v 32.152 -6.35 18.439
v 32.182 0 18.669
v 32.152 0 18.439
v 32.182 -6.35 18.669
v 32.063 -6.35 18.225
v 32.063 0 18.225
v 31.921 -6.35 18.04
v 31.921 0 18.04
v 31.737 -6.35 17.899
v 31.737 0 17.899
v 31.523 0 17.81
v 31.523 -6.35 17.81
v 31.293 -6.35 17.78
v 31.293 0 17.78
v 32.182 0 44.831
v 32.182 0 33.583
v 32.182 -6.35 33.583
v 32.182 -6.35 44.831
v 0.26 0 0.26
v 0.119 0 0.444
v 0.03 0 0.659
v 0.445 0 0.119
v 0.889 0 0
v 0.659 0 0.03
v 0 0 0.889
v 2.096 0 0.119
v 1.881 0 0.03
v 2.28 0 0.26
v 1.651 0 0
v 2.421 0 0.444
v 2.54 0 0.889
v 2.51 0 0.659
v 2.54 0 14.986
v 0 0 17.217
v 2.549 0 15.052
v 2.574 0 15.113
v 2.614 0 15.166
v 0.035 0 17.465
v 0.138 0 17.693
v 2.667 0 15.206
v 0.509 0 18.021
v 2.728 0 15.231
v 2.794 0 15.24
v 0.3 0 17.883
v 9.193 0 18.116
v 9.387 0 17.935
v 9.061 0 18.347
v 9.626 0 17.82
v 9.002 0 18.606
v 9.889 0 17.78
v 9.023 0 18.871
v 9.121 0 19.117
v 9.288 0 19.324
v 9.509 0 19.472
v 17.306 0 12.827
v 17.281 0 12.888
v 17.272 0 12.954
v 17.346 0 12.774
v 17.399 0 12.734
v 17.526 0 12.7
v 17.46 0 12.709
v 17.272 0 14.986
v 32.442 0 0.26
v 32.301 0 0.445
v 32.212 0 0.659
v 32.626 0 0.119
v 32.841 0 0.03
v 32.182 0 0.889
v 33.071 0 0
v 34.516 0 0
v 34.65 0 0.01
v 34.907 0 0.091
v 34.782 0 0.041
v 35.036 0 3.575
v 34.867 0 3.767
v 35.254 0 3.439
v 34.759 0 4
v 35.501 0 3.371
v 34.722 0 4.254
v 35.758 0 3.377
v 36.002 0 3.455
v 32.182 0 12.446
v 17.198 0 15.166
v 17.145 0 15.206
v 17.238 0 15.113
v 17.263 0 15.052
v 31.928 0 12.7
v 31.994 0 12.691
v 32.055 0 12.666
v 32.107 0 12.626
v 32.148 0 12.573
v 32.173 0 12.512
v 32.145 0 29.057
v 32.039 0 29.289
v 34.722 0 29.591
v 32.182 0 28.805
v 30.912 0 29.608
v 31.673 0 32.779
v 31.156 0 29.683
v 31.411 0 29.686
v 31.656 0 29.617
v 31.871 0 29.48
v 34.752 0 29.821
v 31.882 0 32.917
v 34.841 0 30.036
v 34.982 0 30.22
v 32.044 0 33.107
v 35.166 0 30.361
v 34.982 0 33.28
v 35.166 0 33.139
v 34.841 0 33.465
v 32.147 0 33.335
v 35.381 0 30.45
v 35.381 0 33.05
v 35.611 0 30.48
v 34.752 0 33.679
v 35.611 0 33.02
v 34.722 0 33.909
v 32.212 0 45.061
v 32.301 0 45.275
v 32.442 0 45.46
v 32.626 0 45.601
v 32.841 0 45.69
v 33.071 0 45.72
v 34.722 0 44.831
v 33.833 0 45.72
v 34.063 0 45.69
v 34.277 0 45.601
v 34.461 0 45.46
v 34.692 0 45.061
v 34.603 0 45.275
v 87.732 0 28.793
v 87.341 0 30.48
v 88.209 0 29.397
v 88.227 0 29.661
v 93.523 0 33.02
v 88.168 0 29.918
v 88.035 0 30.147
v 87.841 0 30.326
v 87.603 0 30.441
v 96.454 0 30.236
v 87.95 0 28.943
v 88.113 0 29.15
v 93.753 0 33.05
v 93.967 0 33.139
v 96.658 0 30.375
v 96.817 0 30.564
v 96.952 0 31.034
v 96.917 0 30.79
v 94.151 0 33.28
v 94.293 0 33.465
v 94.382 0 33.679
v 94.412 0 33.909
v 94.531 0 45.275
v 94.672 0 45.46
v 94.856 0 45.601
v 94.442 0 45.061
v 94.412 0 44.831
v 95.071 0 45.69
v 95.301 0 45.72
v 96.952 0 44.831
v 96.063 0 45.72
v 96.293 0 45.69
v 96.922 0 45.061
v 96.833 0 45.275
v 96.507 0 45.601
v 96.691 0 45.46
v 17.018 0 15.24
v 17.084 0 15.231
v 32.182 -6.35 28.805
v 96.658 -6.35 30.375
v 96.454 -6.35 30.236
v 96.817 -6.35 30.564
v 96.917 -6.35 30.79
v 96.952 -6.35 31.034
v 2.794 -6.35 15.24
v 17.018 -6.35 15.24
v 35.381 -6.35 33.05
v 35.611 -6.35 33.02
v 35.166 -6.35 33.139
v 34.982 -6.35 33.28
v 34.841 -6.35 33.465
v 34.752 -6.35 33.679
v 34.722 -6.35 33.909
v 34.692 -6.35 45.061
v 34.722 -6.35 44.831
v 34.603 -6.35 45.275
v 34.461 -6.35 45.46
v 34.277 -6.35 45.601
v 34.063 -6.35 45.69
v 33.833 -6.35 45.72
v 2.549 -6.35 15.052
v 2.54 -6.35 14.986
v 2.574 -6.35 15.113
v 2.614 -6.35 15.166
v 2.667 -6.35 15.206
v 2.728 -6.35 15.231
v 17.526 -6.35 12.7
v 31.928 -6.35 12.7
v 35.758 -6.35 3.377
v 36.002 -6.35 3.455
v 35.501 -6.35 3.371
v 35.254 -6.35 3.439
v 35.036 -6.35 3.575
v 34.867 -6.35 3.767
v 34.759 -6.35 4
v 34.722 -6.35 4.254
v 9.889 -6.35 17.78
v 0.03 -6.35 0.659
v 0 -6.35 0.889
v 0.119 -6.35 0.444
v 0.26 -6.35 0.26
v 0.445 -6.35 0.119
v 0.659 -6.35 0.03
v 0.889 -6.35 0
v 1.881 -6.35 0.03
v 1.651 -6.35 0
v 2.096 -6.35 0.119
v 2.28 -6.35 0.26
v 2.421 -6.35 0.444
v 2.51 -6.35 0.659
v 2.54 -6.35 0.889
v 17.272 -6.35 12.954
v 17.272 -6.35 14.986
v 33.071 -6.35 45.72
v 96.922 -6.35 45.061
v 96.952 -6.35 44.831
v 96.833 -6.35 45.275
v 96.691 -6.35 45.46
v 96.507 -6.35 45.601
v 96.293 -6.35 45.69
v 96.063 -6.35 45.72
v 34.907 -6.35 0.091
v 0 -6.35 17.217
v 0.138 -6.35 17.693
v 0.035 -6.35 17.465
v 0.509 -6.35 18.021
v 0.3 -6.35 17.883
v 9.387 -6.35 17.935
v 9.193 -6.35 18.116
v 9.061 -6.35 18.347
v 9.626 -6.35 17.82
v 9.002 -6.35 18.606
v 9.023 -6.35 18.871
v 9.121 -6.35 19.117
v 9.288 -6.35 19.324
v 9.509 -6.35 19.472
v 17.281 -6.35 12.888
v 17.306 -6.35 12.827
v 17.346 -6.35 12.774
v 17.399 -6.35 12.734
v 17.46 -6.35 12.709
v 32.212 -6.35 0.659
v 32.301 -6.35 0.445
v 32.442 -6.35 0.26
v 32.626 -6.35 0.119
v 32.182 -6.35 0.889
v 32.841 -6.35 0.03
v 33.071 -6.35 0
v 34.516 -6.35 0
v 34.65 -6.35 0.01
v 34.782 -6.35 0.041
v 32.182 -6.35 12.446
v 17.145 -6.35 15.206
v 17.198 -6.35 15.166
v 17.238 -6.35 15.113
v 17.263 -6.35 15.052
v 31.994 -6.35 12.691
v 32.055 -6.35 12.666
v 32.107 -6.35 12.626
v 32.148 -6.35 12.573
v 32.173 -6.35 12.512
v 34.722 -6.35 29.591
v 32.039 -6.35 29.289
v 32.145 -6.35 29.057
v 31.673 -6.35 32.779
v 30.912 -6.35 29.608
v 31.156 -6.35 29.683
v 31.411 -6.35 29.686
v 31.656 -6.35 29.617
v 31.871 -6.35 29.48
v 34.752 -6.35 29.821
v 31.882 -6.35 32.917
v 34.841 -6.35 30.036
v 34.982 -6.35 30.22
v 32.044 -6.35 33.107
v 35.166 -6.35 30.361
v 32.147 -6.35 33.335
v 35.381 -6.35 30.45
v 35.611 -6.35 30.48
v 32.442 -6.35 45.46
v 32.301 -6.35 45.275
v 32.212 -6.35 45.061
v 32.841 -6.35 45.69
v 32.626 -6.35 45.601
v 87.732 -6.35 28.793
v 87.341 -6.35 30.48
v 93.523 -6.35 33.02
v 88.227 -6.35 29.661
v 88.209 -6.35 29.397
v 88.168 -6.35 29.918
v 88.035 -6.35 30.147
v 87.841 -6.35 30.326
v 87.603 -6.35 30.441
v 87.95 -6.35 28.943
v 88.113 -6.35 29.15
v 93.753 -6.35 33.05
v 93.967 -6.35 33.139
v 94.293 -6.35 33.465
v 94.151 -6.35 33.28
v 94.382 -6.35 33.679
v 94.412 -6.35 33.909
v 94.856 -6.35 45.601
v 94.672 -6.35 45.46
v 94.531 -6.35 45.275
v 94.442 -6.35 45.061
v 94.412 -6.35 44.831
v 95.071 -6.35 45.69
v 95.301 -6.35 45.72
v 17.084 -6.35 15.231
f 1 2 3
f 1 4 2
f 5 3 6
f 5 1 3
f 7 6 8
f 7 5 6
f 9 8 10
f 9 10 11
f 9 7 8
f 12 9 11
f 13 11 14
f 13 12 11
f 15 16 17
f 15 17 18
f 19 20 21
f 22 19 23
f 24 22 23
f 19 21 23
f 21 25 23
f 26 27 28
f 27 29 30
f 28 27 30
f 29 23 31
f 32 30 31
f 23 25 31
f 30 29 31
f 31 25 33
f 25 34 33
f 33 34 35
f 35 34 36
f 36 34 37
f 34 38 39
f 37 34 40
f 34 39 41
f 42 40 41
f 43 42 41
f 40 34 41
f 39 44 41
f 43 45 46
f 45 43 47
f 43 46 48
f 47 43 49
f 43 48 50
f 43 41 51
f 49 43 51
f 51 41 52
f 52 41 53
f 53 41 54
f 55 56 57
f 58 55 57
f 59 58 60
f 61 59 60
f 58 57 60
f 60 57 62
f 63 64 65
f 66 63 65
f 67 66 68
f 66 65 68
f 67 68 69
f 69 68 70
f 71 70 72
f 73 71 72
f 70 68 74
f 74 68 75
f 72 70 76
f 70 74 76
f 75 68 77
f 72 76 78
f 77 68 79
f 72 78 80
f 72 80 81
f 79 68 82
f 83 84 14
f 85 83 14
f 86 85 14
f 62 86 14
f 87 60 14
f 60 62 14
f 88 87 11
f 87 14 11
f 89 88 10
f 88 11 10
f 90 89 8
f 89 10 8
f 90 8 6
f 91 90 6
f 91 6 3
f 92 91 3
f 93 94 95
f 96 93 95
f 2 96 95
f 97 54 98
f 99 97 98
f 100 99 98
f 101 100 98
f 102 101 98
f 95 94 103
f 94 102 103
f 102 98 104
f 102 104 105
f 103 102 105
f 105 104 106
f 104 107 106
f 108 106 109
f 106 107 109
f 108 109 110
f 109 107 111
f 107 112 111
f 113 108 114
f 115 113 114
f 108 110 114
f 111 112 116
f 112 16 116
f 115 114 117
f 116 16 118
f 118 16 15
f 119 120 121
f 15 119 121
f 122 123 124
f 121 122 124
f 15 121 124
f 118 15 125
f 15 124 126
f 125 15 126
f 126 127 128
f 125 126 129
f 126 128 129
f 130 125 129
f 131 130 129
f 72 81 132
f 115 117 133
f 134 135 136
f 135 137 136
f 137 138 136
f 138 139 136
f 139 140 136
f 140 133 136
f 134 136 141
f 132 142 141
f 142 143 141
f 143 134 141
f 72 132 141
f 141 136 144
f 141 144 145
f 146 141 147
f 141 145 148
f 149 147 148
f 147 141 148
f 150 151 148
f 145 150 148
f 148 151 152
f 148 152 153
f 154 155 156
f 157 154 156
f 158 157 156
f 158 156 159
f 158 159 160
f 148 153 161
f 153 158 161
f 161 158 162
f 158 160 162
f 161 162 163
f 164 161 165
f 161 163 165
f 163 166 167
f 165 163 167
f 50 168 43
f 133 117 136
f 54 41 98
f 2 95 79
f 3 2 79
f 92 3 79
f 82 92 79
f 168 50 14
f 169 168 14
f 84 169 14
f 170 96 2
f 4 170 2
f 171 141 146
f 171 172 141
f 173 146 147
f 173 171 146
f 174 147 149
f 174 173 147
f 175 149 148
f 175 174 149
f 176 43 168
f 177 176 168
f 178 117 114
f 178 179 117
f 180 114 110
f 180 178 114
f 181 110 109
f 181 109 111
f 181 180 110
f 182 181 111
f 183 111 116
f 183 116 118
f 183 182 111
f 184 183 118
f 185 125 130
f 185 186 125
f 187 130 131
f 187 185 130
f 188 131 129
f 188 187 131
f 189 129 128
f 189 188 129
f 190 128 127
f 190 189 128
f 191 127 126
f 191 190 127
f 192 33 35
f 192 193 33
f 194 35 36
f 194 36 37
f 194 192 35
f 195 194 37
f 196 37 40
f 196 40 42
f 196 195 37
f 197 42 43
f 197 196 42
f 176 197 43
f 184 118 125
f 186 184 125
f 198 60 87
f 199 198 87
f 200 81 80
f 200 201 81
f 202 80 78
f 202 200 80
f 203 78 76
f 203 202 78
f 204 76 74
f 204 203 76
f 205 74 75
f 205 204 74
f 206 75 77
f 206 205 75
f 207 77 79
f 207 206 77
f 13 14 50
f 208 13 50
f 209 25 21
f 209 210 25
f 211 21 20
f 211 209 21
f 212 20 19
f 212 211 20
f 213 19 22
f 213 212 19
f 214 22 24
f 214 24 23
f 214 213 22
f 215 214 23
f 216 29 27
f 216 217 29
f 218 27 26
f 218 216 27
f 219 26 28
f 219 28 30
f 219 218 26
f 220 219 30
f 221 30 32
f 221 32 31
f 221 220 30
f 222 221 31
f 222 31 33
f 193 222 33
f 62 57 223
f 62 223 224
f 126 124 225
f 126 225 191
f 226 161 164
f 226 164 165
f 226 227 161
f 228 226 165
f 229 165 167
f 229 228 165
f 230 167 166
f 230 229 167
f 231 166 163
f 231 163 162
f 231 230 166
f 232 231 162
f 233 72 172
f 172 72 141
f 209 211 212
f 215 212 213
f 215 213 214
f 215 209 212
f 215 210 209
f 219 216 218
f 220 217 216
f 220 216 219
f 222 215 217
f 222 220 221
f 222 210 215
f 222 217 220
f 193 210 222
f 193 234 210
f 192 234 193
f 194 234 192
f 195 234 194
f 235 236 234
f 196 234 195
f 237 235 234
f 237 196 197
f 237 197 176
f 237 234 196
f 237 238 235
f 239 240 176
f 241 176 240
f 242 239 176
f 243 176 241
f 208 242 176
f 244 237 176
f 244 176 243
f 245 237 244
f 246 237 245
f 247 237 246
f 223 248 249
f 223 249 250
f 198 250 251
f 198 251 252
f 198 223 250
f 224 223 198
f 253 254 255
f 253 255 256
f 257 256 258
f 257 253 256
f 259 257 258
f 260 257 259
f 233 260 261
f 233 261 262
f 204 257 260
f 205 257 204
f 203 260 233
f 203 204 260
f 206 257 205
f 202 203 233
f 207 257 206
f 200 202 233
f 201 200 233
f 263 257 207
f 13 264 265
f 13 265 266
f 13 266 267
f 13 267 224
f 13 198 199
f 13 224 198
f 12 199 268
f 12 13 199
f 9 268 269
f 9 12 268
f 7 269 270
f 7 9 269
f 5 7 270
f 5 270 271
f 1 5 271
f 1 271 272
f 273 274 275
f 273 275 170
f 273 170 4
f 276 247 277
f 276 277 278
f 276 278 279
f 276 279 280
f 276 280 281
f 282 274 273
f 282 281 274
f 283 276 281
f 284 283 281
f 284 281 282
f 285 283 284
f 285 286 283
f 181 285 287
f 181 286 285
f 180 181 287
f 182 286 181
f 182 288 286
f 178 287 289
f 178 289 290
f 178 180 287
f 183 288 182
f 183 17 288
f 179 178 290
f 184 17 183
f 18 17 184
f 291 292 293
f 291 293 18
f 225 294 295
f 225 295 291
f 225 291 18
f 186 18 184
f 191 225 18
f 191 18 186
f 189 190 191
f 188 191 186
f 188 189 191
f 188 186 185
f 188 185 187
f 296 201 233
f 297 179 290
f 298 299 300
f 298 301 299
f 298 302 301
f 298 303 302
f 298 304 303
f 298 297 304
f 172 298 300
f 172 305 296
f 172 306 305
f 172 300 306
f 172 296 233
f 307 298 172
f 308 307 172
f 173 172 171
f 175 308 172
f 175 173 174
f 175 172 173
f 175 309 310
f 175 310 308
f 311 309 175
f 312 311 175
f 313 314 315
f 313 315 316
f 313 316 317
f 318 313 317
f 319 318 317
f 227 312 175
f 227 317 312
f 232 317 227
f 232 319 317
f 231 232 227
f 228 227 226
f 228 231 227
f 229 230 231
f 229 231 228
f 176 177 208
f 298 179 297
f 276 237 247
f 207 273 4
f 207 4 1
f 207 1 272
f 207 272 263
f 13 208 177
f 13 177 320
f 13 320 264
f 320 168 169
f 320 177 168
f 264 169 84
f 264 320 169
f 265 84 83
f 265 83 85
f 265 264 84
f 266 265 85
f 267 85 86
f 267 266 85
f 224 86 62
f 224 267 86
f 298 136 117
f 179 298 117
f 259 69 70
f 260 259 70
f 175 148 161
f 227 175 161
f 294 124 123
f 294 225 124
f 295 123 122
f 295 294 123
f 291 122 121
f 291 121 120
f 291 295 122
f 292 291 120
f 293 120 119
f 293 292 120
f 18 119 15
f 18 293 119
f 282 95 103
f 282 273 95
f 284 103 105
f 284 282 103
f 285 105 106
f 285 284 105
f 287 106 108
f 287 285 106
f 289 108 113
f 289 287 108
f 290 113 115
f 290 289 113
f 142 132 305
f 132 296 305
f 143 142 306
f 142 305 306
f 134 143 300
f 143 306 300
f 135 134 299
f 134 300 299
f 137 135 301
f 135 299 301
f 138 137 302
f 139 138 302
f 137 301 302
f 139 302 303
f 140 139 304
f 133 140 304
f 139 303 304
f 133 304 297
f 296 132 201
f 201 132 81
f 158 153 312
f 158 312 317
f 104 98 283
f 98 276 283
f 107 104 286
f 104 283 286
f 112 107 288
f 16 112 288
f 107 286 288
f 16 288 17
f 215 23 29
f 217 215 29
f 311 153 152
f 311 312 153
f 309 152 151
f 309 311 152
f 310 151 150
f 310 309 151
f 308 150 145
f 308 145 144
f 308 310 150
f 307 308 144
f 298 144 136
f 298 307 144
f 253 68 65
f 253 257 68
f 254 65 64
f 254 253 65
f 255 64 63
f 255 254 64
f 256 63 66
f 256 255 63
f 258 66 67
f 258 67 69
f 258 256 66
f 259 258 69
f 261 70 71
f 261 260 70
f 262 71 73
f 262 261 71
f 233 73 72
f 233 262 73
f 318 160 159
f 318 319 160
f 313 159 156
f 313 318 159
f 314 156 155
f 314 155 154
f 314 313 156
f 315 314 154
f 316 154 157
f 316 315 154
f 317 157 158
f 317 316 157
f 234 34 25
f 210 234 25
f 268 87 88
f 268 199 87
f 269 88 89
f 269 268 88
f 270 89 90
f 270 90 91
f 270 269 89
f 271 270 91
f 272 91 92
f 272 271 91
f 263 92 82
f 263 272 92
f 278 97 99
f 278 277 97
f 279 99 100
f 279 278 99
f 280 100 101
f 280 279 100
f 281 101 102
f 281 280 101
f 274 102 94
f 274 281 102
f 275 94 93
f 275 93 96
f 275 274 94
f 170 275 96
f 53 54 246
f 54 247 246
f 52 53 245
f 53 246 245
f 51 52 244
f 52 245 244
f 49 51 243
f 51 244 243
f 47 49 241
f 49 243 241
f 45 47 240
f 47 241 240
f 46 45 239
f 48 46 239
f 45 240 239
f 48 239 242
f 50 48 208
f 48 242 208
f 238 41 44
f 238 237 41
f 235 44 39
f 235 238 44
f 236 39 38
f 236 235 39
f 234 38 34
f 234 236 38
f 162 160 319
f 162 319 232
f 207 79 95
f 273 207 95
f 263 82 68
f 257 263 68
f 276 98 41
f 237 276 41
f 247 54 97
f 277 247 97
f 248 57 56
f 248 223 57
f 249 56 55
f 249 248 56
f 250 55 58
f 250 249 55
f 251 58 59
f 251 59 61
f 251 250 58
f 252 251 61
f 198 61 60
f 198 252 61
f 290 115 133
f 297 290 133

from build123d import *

# Parameters (mm, degrees)
F0_W     = 14.9098
F0_H     = 2.54
F0_W_2   = 2.54
F0_H_2   = 12.7
F1_DEPTH = 6.35
F2_R     = 0.889
F3_R     = 0.254


# Not quite as in the source:
# - a feature names something its author has since deleted; it is built from what else it names


with BuildPart() as f1:
    # F0 (on Front) → F1 (new body)
    with BuildSketch(Plane.XZ):
        Polygon((32.1818, 20.32), (32.1818, 17.78), (34.7218, 17.78), (34.7218, 30.48), (34.7218, 33.02), (32.1818, 33.02), (32.1818, 30.2095859146), align=None)
        Polygon((34.7218, 17.78), (32.1818, 17.78), (32.1818, 15.24), (32.1818, 12.7), (32.1818, 0), (34.7218, 0), (34.7218, 2.8283102922), (34.7218, 13.97), align=None)
        Polygon((0, 17.78), (2.54, 17.78), (5.9346577437, 17.78), (32.1818, 30.2095859146), (32.1818, 33.02), align=None)
        Polygon((5.9346577437, 17.78), (2.54, 17.78), (2.54, 15.24), (17.272, 15.24), (32.1818, 15.24), (32.1818, 17.78), align=None)
        with Locations((24.7269, 13.97)):
            Rectangle(F0_W, F0_H)
        Polygon((2.54, 15.24), (2.54, 17.78), (0, 17.78), (0, 0), (2.54, 0), align=None)
        Polygon((91.1773331535, 30.48), (34.7218, 2.8283102922), (34.7218, 0), (96.9518, 30.48), align=None)
        Polygon((94.4118, 33.02), (34.7218, 33.02), (34.7218, 30.48), (91.1773331535, 30.48), (96.9518, 30.48), (96.9518, 33.02), align=None)
        with Locations((95.6818, 39.37)):
            Rectangle(F0_W_2, F0_H_2)
        with Locations((33.4518, 39.37)):
            Rectangle(F0_W_2, F0_H_2)
    extrude(amount=F1_DEPTH)

    # F2
    f2_edges = [f1.edges().sort_by_distance(p)[0] for p in [
        (0, -3.175, 0),
        (2.54, -3.175, 0),
        (32.1818, -3.175, 0),
        (34.7218, -3.175, 0),
        (32.1818, -3.175, 33.02),
        (0, -3.175, 17.78),
        (32.1818, -3.175, 17.78),
        (32.1818, -3.175, 30.209586),
        (5.934658, -3.175, 17.78),
        (34.7218, -3.175, 2.82831),
        (34.7218, -3.175, 30.48),
        (91.177333, -3.175, 30.48),
        (96.9518, -3.175, 30.48),
        (96.9518, -3.175, 45.72),
        (94.4118, -3.175, 45.72),
        (94.4118, -3.175, 33.02),
        (32.1818, -3.175, 45.72),
        (34.7218, -3.175, 45.72),
        (34.7218, -3.175, 33.02),
    ]]
    fillet(f2_edges, radius=F2_R)

    # F3
    f3_edges = [f1.edges().sort_by_distance(p)[0] for p in [
        (2.54, -3.175, 15.24),
        (17.272, -3.175, 15.24),
        (17.272, -3.175, 12.7),
        (32.1818, -3.175, 12.7),
    ]]
    fillet(f3_edges, radius=F3_R)


solid = f1.part
